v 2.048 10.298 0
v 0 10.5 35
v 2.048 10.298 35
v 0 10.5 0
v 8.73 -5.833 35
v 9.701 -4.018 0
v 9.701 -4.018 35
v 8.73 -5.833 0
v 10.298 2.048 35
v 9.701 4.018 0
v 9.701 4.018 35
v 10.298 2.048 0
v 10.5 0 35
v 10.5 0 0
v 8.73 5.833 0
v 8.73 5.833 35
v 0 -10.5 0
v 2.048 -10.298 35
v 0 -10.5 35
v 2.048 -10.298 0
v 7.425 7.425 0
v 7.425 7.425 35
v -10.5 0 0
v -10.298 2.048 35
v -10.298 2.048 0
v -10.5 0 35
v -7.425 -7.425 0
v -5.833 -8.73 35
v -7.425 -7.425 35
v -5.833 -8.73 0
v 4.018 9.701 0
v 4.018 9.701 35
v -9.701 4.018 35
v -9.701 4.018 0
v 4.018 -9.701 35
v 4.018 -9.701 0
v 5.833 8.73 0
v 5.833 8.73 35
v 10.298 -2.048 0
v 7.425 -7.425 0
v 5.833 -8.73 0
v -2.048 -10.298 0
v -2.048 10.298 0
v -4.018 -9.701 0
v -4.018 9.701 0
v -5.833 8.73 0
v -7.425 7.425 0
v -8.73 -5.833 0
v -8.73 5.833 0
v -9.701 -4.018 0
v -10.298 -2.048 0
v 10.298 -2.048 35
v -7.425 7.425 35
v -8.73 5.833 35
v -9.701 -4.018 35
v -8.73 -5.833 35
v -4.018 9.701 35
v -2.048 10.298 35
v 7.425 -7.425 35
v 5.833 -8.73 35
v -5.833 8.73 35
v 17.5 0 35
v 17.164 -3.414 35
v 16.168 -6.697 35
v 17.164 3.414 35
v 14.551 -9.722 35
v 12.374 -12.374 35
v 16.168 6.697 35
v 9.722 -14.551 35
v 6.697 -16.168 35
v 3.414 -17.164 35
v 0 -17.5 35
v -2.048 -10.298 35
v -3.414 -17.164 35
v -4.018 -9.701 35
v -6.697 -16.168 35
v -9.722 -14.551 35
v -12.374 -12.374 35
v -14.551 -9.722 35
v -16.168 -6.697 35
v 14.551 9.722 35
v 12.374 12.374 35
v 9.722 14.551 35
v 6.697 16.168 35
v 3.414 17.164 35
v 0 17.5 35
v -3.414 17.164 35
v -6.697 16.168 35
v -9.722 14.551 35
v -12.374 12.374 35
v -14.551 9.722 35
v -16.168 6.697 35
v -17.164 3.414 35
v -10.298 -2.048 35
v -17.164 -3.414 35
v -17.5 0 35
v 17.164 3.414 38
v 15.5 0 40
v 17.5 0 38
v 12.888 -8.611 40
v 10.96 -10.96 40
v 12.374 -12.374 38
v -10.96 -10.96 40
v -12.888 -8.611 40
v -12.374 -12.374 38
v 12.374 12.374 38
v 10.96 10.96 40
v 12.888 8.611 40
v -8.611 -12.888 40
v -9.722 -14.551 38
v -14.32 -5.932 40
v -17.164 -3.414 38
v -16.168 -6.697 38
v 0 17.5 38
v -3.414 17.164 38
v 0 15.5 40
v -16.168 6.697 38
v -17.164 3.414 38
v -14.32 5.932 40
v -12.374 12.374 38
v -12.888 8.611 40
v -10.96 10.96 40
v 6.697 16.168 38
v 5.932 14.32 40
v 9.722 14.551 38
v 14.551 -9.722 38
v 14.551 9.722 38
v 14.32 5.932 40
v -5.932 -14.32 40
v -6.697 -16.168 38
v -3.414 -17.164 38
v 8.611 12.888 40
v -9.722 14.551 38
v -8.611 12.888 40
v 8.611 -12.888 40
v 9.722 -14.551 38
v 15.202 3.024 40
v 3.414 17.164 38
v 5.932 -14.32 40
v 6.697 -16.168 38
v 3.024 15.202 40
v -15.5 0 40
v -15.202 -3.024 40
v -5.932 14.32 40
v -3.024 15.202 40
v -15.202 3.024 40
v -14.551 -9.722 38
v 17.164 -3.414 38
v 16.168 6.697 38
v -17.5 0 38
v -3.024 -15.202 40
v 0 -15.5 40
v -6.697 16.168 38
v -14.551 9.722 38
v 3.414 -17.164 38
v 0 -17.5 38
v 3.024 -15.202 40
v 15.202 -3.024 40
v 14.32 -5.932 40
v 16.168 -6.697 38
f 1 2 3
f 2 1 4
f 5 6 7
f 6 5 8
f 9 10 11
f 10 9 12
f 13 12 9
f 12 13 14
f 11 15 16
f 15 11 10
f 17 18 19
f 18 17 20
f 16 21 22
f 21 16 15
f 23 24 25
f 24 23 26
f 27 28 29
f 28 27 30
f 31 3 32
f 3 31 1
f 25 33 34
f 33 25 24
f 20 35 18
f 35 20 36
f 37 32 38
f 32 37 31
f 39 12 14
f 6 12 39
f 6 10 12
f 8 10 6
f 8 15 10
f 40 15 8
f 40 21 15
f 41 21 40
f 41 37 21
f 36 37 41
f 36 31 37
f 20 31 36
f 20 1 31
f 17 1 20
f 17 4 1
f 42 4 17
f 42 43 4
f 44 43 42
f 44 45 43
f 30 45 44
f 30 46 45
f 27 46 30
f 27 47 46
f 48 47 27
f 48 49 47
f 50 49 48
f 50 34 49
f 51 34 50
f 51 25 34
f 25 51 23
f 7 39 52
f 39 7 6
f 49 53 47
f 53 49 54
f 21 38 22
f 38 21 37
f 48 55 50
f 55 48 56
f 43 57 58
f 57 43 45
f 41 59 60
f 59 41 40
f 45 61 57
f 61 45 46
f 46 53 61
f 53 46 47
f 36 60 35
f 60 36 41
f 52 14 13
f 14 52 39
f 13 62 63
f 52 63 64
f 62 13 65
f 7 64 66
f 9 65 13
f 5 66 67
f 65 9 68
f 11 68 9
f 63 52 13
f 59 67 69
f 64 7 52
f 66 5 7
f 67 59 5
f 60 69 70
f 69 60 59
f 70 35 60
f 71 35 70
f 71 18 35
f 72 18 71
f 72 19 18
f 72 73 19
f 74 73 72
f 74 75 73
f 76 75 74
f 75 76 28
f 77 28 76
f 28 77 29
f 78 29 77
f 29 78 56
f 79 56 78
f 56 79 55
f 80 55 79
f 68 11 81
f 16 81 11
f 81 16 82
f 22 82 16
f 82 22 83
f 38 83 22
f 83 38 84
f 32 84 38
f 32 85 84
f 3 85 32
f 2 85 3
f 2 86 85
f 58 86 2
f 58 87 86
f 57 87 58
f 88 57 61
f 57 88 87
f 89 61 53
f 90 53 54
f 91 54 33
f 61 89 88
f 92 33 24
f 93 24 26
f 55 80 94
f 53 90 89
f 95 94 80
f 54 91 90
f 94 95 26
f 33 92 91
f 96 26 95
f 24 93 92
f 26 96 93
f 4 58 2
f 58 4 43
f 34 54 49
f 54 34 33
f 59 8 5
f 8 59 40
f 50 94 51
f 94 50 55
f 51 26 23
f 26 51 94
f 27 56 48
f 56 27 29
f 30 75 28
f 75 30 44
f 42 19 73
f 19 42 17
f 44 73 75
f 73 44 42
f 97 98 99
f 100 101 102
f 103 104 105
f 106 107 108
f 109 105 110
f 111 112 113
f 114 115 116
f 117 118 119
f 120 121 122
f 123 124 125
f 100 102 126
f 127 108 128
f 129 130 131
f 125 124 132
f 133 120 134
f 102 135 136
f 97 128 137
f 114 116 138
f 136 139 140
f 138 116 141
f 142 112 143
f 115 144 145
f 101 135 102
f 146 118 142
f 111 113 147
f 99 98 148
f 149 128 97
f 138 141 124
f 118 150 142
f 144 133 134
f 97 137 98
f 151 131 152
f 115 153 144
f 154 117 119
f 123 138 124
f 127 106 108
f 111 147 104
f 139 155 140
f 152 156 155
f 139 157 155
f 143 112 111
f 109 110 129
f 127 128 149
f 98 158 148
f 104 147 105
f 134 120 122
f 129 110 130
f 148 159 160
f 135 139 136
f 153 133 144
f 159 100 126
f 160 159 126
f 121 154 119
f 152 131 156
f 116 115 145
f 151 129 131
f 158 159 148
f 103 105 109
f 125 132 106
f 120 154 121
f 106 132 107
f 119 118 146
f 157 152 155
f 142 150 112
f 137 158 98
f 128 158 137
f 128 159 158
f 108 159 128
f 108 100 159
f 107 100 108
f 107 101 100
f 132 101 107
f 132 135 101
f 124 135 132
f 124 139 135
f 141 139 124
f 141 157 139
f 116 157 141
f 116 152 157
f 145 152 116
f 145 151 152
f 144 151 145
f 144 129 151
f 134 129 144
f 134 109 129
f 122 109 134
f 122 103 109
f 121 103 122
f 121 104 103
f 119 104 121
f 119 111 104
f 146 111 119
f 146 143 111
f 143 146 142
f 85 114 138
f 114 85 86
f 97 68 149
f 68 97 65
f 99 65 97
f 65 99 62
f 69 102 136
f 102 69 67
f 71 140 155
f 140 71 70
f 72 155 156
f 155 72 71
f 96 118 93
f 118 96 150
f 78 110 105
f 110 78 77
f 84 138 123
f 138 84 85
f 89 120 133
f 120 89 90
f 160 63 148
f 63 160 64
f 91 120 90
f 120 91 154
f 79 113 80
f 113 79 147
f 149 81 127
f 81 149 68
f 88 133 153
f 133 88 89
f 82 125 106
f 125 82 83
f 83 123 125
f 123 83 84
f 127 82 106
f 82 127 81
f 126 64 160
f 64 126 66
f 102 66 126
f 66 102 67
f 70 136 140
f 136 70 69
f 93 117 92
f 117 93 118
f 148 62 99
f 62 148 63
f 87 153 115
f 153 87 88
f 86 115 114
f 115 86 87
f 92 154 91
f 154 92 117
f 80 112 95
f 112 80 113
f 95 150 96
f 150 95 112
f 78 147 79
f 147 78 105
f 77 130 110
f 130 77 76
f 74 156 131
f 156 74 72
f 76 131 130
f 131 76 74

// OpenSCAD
$fn= 32;
union(){
cylinder(d=21,h=35);
translate([0,0,38]) cylinder(d1=35,d2=31,h=2);
translate([0,0,35]) cylinder(d=35,h=3);
}
